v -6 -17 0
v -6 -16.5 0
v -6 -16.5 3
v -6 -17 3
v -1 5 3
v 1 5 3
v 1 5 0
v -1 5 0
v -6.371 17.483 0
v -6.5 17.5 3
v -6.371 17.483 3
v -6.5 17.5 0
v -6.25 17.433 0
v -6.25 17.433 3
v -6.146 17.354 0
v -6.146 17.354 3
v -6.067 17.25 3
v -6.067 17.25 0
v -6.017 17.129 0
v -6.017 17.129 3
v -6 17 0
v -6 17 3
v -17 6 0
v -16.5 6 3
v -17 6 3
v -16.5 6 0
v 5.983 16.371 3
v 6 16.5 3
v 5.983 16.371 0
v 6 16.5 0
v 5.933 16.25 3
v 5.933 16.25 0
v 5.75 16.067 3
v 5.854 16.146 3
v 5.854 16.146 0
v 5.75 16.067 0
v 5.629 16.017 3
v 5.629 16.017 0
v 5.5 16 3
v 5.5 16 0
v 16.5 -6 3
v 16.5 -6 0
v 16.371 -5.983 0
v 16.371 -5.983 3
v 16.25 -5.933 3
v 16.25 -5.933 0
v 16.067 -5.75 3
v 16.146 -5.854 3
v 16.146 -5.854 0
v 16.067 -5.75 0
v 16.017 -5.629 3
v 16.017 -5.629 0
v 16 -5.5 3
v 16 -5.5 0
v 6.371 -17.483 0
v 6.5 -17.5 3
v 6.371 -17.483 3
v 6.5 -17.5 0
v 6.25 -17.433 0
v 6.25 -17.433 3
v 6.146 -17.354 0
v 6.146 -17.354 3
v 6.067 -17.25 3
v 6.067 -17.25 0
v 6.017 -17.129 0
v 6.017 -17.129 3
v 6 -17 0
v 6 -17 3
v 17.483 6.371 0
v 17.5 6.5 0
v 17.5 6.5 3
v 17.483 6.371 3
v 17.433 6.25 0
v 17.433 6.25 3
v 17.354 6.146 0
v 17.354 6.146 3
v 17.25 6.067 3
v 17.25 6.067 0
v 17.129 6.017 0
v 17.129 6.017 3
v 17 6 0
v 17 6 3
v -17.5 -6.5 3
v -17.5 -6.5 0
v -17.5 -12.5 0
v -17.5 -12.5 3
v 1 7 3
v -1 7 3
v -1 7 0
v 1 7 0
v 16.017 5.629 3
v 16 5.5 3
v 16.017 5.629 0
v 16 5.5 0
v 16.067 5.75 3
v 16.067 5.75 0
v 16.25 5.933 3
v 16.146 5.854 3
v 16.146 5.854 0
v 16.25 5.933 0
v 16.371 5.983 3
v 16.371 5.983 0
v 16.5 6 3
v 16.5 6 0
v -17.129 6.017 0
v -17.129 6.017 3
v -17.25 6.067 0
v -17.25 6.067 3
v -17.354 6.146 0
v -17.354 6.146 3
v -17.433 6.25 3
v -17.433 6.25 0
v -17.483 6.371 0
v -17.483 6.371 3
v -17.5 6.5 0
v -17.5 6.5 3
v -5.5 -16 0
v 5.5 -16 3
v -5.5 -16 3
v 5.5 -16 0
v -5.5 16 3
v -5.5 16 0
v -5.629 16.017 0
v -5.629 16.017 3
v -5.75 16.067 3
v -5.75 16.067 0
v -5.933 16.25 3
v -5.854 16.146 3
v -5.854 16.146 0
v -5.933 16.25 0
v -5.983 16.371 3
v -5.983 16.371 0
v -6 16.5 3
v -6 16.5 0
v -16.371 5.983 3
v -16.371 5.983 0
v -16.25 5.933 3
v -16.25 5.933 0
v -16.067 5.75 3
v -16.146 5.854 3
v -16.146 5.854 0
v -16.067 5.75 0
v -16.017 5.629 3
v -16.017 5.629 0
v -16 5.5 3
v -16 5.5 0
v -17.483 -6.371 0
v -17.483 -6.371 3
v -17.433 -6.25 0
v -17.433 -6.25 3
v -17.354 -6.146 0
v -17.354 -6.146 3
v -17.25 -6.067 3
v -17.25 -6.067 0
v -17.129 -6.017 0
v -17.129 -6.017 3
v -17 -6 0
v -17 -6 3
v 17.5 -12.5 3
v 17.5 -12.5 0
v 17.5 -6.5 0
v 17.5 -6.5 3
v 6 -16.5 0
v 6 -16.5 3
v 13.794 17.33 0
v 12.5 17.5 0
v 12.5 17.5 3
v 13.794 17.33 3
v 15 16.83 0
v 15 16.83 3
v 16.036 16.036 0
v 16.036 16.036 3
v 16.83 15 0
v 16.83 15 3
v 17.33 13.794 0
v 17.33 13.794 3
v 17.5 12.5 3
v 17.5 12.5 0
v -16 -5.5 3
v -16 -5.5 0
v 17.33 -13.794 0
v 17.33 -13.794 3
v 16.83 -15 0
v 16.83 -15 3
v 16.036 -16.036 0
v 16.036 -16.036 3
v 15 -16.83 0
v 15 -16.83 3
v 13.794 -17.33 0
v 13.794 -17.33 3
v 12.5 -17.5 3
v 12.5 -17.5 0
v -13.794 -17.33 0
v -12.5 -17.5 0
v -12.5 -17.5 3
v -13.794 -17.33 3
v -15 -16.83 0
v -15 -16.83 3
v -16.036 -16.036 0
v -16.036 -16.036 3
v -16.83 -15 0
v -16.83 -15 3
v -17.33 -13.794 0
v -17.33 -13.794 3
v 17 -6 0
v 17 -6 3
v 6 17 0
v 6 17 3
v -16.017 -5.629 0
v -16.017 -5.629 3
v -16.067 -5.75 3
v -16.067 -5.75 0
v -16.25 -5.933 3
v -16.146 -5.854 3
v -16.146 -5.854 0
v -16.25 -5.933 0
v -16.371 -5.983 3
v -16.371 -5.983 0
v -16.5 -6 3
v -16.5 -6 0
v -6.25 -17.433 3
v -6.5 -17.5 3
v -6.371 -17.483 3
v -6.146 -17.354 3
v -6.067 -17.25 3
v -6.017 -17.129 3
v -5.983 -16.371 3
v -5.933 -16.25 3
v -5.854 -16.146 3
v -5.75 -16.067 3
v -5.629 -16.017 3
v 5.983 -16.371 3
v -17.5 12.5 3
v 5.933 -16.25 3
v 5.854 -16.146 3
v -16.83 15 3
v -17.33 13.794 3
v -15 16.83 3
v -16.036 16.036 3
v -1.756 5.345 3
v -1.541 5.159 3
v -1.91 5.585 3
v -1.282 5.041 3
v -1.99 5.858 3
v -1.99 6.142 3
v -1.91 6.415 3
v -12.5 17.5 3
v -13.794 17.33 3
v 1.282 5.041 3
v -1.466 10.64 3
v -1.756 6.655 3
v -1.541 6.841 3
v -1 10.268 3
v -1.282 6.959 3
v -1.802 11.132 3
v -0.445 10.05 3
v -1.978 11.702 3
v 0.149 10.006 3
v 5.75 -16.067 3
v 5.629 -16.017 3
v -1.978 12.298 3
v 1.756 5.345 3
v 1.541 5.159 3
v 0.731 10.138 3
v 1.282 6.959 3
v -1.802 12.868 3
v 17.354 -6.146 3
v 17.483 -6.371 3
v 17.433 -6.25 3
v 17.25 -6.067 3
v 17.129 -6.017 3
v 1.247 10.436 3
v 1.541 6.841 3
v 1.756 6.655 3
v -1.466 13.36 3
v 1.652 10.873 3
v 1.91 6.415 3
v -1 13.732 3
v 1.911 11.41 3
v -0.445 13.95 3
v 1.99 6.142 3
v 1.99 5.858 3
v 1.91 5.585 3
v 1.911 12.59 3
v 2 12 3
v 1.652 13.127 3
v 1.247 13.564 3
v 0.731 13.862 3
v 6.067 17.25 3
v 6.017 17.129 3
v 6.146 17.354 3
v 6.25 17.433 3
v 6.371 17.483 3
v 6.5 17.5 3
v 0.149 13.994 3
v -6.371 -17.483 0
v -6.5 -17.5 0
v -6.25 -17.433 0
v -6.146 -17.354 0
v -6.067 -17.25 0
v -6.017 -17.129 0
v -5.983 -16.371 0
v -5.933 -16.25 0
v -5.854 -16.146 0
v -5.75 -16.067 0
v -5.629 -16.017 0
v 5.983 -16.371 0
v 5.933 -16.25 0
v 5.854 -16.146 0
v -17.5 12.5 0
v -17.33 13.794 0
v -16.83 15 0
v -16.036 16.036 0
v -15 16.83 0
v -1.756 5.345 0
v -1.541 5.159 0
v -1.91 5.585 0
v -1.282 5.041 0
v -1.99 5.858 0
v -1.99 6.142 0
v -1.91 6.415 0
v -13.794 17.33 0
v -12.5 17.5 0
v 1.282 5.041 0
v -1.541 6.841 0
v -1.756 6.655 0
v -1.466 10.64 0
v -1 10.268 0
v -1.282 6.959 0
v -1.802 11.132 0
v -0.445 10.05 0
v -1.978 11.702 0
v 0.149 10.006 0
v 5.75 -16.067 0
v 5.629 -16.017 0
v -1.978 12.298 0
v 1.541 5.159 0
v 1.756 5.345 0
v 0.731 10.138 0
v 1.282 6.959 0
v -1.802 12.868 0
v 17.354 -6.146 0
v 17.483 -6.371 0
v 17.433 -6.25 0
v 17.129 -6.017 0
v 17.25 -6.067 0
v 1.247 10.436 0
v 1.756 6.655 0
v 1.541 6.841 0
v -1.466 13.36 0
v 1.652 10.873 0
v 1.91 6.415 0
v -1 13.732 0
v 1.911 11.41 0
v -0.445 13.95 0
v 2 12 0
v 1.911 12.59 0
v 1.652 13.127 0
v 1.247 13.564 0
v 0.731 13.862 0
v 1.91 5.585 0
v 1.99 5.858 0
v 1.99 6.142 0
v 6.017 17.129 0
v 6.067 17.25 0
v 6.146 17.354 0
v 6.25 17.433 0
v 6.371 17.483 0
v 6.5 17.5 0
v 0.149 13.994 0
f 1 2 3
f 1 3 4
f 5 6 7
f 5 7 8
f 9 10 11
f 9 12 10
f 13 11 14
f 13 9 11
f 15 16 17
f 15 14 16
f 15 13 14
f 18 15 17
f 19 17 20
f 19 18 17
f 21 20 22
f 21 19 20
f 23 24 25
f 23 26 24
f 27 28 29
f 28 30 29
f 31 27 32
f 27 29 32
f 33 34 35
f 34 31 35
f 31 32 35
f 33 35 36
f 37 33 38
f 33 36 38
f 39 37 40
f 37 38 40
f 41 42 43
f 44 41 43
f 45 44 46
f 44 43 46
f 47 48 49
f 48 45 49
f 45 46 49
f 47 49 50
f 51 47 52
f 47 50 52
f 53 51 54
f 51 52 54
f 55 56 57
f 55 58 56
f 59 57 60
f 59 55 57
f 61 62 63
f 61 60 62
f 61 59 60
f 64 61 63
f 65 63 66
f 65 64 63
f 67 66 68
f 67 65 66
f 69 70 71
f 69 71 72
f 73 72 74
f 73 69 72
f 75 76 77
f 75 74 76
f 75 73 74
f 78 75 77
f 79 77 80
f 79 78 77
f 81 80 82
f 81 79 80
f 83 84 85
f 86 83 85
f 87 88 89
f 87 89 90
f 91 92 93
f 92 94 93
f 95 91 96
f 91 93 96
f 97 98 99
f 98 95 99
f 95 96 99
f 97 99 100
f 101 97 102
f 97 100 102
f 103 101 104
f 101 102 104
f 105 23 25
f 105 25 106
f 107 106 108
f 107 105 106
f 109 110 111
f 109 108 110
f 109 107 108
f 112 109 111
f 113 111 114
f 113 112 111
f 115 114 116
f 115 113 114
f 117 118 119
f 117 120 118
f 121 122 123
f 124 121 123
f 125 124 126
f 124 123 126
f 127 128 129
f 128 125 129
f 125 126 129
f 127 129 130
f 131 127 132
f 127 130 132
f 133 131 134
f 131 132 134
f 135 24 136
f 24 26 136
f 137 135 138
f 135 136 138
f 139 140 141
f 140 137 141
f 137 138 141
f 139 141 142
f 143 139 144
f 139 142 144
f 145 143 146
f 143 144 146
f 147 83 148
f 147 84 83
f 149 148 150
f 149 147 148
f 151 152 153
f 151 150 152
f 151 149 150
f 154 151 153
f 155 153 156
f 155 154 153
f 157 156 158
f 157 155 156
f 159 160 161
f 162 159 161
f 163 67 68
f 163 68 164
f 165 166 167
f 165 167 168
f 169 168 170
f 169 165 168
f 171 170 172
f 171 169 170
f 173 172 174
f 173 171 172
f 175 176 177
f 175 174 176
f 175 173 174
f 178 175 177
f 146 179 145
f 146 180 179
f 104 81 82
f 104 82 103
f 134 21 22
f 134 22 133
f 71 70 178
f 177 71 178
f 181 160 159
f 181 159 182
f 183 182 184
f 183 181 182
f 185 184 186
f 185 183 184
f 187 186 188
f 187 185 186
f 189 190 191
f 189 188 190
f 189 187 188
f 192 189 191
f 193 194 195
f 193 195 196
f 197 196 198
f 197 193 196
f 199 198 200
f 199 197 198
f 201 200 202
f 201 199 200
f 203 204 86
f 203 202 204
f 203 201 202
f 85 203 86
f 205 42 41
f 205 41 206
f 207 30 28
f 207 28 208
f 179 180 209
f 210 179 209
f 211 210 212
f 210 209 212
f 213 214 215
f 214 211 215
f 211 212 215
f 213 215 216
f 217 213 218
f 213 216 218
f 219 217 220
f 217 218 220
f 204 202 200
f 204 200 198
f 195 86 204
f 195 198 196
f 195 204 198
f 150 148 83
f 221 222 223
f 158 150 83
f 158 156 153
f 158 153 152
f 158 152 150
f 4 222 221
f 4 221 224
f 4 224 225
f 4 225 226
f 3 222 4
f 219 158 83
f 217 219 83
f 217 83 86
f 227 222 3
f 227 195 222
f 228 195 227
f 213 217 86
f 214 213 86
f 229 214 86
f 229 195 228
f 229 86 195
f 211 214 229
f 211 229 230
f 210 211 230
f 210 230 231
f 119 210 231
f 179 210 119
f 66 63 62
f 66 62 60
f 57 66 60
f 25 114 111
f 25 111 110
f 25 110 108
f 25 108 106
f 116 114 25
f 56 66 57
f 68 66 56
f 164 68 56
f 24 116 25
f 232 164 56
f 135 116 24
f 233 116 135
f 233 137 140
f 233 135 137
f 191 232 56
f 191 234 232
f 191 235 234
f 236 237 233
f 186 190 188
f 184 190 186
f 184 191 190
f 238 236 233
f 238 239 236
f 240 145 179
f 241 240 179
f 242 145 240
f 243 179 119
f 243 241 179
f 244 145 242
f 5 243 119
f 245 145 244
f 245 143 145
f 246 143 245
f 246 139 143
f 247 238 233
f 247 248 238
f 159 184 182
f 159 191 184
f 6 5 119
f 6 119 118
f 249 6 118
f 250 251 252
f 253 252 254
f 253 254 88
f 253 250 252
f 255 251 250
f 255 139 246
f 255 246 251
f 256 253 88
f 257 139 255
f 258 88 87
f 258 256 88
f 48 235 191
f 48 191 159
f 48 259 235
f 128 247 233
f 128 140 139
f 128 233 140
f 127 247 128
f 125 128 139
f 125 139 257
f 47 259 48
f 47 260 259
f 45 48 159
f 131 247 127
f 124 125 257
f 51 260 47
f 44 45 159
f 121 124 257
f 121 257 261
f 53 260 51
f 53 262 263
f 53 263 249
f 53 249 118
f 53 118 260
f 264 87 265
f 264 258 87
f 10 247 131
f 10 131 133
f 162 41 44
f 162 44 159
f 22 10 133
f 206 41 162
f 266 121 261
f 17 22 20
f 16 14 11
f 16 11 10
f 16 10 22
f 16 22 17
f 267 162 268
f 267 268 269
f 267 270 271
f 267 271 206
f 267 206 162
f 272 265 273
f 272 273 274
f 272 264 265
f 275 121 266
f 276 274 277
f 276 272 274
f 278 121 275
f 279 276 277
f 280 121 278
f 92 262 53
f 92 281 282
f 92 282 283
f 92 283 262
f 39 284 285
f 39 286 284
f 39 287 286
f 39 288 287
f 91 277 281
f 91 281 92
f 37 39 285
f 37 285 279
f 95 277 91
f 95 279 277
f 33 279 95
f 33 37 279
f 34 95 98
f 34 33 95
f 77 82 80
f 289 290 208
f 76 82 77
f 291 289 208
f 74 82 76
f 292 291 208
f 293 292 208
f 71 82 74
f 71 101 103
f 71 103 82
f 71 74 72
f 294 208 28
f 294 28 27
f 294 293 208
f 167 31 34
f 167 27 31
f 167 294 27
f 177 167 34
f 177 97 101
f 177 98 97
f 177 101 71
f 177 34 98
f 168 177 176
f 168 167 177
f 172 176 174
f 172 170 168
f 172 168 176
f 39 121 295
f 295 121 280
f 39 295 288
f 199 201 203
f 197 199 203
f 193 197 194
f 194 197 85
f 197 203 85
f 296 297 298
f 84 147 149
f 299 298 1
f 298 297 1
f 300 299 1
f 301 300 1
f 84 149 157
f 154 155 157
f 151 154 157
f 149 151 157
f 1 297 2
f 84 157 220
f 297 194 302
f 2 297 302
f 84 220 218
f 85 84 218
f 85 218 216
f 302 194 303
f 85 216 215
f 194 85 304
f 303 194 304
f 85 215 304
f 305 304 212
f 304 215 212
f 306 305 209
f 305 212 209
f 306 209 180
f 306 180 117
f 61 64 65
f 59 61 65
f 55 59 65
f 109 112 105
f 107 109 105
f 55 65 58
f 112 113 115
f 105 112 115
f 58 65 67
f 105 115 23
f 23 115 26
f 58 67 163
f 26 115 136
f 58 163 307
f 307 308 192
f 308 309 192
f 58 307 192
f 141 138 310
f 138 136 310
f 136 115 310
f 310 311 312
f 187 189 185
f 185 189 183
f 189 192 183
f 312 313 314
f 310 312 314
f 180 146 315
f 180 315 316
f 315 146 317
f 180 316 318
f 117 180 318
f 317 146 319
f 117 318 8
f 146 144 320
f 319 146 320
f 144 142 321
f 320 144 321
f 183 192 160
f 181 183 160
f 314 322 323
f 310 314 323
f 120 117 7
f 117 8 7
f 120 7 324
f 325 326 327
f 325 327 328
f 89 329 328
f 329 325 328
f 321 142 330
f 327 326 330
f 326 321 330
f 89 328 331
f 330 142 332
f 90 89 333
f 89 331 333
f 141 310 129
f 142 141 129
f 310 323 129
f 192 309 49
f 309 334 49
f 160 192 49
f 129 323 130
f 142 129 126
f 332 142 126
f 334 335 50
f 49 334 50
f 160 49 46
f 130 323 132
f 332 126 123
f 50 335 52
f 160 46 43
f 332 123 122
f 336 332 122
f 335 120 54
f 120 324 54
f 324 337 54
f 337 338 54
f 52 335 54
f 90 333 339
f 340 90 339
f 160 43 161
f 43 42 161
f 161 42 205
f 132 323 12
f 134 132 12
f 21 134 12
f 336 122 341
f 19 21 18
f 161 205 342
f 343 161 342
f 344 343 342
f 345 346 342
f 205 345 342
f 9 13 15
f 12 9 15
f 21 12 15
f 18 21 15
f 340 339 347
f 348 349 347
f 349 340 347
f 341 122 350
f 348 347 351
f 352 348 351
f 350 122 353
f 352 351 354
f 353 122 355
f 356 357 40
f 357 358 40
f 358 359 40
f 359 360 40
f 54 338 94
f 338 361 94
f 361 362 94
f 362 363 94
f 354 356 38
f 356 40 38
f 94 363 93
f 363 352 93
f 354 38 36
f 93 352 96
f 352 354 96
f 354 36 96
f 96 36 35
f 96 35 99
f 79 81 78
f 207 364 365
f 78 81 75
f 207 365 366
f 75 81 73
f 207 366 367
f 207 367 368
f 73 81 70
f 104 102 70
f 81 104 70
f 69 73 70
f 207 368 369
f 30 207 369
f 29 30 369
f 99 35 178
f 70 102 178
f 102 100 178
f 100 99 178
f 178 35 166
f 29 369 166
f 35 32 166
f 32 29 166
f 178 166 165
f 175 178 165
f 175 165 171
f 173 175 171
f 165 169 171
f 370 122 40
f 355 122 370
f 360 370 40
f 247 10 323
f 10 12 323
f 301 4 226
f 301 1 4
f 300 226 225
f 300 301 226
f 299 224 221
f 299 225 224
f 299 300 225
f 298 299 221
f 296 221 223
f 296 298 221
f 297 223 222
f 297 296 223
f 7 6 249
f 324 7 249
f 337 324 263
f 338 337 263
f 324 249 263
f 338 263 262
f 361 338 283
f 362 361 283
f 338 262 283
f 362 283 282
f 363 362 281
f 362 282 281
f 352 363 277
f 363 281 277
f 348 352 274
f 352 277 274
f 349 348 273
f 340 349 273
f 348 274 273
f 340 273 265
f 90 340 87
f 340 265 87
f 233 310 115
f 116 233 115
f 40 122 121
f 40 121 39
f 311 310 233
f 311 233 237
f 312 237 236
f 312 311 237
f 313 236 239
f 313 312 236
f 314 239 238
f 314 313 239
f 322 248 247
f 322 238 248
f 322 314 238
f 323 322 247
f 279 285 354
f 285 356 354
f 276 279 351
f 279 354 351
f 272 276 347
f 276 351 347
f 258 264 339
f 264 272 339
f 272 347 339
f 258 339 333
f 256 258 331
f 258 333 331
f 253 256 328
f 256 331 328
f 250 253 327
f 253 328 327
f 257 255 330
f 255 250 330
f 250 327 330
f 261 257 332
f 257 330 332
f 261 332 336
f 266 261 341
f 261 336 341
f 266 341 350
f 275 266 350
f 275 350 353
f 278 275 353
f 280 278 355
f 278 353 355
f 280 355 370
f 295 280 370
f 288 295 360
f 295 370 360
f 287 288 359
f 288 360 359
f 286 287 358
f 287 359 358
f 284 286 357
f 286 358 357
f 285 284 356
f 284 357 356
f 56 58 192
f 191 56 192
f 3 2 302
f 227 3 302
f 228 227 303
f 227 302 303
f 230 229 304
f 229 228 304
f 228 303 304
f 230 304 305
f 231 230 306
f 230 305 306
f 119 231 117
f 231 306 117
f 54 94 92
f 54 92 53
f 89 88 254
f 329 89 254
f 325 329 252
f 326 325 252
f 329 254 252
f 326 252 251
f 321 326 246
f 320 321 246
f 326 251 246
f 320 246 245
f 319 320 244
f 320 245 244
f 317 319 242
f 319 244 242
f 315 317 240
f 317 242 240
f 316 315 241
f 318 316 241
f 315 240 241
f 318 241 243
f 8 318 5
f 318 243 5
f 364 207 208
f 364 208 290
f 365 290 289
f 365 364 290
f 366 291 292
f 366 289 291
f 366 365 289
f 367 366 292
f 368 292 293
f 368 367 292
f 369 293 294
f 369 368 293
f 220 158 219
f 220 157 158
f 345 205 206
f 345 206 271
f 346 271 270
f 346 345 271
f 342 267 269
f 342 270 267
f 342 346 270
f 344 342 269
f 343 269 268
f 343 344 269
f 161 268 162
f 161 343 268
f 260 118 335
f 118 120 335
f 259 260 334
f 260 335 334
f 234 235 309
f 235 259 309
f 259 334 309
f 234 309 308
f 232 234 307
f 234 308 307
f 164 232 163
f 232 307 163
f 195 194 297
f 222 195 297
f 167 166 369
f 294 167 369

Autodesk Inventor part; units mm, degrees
ref_plane "YZ Plane" through (0, 0, 0) normal (1, 0, 0) x (0, 1, 0)
ref_plane "XZ Plane" through (0, 0, 0) normal (0, 1, 0) x (-1, 0, 0)
ref_plane "XY Plane" through (0, 0, 0) normal (0, 0, 1) x (1, 0, 0)
sketch "Sketch1" plane through (0, 0, 0) normal (0, 0, 1) x (1, 0, 0)
  circle A0 centre (0, 12) radius 2
  line L0 (-17, -6) -> (-16.5, -6)
  line L1 (-16, -5.5) -> (-16, 5.5)
  line L2 (-16.5, 6) -> (-17, 6)
  line L3 (-17.5, 12.5) -> (-17.5, 6.5)
  line L4 (-17.5, -6.5) -> (-17.5, -12.5)
  arc A1 (-16.5, -6) -> (-16, -5.5) centre (-16.5, -5.5) ccw
  arc A2 (-16, 5.5) -> (-16.5, 6) centre (-16.5, 5.5) ccw
  arc A3 (-17.5, 6.5) -> (-17, 6) centre (-17, 6.5) ccw
  arc A4 (-17, -6) -> (-17.5, -6.5) centre (-17, -6.5) ccw
  line L5 (6, -17) -> (6, -16.5)
  line L6 (5.5, -16) -> (-5.5, -16)
  line L7 (-6, -16.5) -> (-6, -17)
  arc A5 (6, -16.5) -> (5.5, -16) centre (5.5, -16.5) ccw
  arc A6 (-5.5, -16) -> (-6, -16.5) centre (-5.5, -16.5) ccw
  arc A7 (-6.5, -17.5) -> (-6, -17) centre (-6.5, -17) ccw
  arc A8 (6, -17) -> (6.5, -17.5) centre (6.5, -17) ccw
  line L8 (17, 6) -> (16.5, 6)
  line L9 (16, 5.5) -> (16, -5.5)
  line L10 (16.5, -6) -> (17, -6)
  arc A9 (16.5, 6) -> (16, 5.5) centre (16.5, 5.5) ccw
  arc A10 (16, -5.5) -> (16.5, -6) centre (16.5, -5.5) ccw
  arc A11 (17.5, -6.5) -> (17, -6) centre (17, -6.5) ccw
  arc A12 (17, 6) -> (17.5, 6.5) centre (17, 6.5) ccw
  line L11 (-6, 17) -> (-6, 16.5)
  line L12 (-5.5, 16) -> (5.5, 16)
  line L13 (6, 16.5) -> (6, 17)
  arc A13 (-6, 16.5) -> (-5.5, 16) centre (-5.5, 16.5) ccw
  arc A14 (5.5, 16) -> (6, 16.5) centre (5.5, 16.5) ccw
  arc A15 (6.5, 17.5) -> (6, 17) centre (6.5, 17) ccw
  arc A16 (-6, 17) -> (-6.5, 17.5) centre (-6.5, 17) ccw
  line L14 (12.5, 17.5) -> (6.5, 17.5)
  line L15 (-6.5, 17.5) -> (-12.5, 17.5)
  line L16 (17.5, -12.5) -> (17.5, -6.5)
  line L17 (17.5, 6.5) -> (17.5, 12.5)
  line L18 (-12.5, -17.5) -> (-6.5, -17.5)
  line L19 (6.5, -17.5) -> (12.5, -17.5)
  arc A17 (-17.5, -12.5) -> (-12.5, -17.5) centre (-12.5, -12.5) ccw
  arc A18 (-12.5, 17.5) -> (-17.5, 12.5) centre (-12.5, 12.5) ccw
  arc A19 (17.5, 12.5) -> (12.5, 17.5) centre (12.5, 12.5) ccw
  arc A20 (12.5, -17.5) -> (17.5, -12.5) centre (12.5, -12.5) ccw
  point P0 (0, 0)
  point P1 (16, 0)
  point P2 (-16, 6)
  point P3 (-16, -6)
  point P4 (-16, 0)
  point P5 (-6, -16)
  point P6 (6, -16)
  point P7 (0, -16)
  point P8 (16, -6)
  point P9 (16, 6)
  point P10 (6, 16)
  point P11 (-6, 16)
  point P12 (0, 16)
  dimension "d6" = 4
  dimension "d44" = 12
  dimension "d45" = 0.5
  dimension "d48" = 360
  dimension "d50" = 5
  dimension "d64" = 12
  dimension "d65" = 16
  dimension "d66" = 35
extrude "Extrusion6" add sketch "Sketch1" along normal blind 3
sketch "Sketch4" plane through (0, 0, 3) normal (0, 0, 1) x (1, 0, 0)
  line L0 (-1, 7) -> (1, 7)
  line L1 (2, 6) -> (2, 6)
  line L2 (1, 5) -> (-1, 5)
  line L3 (-2, 6) -> (-2, 6)
  arc A0 (-1, 7) -> (-2, 6) centre (-1, 6) ccw
  arc A1 (2, 6) -> (1, 7) centre (1, 6) ccw
  arc A2 (1, 5) -> (2, 6) centre (1, 6) ccw
  arc A3 (-2, 6) -> (-1, 5) centre (-1, 6) ccw
  point P0 (0, 0)
  point P1 (-2, 7)
  point P2 (2, 5)
  point P3 (-2, 5)
  point P4 (0, 5)
  dimension "d76" = 2
  dimension "d77" = 4
  dimension "d78" = 5
  dimension "d79" = 1
extrude "Extrusion8" cut sketch "Sketch4" against normal through all
properties part number "020914 Aft Outer Endcap" material "Polycarbonate, Clear"
